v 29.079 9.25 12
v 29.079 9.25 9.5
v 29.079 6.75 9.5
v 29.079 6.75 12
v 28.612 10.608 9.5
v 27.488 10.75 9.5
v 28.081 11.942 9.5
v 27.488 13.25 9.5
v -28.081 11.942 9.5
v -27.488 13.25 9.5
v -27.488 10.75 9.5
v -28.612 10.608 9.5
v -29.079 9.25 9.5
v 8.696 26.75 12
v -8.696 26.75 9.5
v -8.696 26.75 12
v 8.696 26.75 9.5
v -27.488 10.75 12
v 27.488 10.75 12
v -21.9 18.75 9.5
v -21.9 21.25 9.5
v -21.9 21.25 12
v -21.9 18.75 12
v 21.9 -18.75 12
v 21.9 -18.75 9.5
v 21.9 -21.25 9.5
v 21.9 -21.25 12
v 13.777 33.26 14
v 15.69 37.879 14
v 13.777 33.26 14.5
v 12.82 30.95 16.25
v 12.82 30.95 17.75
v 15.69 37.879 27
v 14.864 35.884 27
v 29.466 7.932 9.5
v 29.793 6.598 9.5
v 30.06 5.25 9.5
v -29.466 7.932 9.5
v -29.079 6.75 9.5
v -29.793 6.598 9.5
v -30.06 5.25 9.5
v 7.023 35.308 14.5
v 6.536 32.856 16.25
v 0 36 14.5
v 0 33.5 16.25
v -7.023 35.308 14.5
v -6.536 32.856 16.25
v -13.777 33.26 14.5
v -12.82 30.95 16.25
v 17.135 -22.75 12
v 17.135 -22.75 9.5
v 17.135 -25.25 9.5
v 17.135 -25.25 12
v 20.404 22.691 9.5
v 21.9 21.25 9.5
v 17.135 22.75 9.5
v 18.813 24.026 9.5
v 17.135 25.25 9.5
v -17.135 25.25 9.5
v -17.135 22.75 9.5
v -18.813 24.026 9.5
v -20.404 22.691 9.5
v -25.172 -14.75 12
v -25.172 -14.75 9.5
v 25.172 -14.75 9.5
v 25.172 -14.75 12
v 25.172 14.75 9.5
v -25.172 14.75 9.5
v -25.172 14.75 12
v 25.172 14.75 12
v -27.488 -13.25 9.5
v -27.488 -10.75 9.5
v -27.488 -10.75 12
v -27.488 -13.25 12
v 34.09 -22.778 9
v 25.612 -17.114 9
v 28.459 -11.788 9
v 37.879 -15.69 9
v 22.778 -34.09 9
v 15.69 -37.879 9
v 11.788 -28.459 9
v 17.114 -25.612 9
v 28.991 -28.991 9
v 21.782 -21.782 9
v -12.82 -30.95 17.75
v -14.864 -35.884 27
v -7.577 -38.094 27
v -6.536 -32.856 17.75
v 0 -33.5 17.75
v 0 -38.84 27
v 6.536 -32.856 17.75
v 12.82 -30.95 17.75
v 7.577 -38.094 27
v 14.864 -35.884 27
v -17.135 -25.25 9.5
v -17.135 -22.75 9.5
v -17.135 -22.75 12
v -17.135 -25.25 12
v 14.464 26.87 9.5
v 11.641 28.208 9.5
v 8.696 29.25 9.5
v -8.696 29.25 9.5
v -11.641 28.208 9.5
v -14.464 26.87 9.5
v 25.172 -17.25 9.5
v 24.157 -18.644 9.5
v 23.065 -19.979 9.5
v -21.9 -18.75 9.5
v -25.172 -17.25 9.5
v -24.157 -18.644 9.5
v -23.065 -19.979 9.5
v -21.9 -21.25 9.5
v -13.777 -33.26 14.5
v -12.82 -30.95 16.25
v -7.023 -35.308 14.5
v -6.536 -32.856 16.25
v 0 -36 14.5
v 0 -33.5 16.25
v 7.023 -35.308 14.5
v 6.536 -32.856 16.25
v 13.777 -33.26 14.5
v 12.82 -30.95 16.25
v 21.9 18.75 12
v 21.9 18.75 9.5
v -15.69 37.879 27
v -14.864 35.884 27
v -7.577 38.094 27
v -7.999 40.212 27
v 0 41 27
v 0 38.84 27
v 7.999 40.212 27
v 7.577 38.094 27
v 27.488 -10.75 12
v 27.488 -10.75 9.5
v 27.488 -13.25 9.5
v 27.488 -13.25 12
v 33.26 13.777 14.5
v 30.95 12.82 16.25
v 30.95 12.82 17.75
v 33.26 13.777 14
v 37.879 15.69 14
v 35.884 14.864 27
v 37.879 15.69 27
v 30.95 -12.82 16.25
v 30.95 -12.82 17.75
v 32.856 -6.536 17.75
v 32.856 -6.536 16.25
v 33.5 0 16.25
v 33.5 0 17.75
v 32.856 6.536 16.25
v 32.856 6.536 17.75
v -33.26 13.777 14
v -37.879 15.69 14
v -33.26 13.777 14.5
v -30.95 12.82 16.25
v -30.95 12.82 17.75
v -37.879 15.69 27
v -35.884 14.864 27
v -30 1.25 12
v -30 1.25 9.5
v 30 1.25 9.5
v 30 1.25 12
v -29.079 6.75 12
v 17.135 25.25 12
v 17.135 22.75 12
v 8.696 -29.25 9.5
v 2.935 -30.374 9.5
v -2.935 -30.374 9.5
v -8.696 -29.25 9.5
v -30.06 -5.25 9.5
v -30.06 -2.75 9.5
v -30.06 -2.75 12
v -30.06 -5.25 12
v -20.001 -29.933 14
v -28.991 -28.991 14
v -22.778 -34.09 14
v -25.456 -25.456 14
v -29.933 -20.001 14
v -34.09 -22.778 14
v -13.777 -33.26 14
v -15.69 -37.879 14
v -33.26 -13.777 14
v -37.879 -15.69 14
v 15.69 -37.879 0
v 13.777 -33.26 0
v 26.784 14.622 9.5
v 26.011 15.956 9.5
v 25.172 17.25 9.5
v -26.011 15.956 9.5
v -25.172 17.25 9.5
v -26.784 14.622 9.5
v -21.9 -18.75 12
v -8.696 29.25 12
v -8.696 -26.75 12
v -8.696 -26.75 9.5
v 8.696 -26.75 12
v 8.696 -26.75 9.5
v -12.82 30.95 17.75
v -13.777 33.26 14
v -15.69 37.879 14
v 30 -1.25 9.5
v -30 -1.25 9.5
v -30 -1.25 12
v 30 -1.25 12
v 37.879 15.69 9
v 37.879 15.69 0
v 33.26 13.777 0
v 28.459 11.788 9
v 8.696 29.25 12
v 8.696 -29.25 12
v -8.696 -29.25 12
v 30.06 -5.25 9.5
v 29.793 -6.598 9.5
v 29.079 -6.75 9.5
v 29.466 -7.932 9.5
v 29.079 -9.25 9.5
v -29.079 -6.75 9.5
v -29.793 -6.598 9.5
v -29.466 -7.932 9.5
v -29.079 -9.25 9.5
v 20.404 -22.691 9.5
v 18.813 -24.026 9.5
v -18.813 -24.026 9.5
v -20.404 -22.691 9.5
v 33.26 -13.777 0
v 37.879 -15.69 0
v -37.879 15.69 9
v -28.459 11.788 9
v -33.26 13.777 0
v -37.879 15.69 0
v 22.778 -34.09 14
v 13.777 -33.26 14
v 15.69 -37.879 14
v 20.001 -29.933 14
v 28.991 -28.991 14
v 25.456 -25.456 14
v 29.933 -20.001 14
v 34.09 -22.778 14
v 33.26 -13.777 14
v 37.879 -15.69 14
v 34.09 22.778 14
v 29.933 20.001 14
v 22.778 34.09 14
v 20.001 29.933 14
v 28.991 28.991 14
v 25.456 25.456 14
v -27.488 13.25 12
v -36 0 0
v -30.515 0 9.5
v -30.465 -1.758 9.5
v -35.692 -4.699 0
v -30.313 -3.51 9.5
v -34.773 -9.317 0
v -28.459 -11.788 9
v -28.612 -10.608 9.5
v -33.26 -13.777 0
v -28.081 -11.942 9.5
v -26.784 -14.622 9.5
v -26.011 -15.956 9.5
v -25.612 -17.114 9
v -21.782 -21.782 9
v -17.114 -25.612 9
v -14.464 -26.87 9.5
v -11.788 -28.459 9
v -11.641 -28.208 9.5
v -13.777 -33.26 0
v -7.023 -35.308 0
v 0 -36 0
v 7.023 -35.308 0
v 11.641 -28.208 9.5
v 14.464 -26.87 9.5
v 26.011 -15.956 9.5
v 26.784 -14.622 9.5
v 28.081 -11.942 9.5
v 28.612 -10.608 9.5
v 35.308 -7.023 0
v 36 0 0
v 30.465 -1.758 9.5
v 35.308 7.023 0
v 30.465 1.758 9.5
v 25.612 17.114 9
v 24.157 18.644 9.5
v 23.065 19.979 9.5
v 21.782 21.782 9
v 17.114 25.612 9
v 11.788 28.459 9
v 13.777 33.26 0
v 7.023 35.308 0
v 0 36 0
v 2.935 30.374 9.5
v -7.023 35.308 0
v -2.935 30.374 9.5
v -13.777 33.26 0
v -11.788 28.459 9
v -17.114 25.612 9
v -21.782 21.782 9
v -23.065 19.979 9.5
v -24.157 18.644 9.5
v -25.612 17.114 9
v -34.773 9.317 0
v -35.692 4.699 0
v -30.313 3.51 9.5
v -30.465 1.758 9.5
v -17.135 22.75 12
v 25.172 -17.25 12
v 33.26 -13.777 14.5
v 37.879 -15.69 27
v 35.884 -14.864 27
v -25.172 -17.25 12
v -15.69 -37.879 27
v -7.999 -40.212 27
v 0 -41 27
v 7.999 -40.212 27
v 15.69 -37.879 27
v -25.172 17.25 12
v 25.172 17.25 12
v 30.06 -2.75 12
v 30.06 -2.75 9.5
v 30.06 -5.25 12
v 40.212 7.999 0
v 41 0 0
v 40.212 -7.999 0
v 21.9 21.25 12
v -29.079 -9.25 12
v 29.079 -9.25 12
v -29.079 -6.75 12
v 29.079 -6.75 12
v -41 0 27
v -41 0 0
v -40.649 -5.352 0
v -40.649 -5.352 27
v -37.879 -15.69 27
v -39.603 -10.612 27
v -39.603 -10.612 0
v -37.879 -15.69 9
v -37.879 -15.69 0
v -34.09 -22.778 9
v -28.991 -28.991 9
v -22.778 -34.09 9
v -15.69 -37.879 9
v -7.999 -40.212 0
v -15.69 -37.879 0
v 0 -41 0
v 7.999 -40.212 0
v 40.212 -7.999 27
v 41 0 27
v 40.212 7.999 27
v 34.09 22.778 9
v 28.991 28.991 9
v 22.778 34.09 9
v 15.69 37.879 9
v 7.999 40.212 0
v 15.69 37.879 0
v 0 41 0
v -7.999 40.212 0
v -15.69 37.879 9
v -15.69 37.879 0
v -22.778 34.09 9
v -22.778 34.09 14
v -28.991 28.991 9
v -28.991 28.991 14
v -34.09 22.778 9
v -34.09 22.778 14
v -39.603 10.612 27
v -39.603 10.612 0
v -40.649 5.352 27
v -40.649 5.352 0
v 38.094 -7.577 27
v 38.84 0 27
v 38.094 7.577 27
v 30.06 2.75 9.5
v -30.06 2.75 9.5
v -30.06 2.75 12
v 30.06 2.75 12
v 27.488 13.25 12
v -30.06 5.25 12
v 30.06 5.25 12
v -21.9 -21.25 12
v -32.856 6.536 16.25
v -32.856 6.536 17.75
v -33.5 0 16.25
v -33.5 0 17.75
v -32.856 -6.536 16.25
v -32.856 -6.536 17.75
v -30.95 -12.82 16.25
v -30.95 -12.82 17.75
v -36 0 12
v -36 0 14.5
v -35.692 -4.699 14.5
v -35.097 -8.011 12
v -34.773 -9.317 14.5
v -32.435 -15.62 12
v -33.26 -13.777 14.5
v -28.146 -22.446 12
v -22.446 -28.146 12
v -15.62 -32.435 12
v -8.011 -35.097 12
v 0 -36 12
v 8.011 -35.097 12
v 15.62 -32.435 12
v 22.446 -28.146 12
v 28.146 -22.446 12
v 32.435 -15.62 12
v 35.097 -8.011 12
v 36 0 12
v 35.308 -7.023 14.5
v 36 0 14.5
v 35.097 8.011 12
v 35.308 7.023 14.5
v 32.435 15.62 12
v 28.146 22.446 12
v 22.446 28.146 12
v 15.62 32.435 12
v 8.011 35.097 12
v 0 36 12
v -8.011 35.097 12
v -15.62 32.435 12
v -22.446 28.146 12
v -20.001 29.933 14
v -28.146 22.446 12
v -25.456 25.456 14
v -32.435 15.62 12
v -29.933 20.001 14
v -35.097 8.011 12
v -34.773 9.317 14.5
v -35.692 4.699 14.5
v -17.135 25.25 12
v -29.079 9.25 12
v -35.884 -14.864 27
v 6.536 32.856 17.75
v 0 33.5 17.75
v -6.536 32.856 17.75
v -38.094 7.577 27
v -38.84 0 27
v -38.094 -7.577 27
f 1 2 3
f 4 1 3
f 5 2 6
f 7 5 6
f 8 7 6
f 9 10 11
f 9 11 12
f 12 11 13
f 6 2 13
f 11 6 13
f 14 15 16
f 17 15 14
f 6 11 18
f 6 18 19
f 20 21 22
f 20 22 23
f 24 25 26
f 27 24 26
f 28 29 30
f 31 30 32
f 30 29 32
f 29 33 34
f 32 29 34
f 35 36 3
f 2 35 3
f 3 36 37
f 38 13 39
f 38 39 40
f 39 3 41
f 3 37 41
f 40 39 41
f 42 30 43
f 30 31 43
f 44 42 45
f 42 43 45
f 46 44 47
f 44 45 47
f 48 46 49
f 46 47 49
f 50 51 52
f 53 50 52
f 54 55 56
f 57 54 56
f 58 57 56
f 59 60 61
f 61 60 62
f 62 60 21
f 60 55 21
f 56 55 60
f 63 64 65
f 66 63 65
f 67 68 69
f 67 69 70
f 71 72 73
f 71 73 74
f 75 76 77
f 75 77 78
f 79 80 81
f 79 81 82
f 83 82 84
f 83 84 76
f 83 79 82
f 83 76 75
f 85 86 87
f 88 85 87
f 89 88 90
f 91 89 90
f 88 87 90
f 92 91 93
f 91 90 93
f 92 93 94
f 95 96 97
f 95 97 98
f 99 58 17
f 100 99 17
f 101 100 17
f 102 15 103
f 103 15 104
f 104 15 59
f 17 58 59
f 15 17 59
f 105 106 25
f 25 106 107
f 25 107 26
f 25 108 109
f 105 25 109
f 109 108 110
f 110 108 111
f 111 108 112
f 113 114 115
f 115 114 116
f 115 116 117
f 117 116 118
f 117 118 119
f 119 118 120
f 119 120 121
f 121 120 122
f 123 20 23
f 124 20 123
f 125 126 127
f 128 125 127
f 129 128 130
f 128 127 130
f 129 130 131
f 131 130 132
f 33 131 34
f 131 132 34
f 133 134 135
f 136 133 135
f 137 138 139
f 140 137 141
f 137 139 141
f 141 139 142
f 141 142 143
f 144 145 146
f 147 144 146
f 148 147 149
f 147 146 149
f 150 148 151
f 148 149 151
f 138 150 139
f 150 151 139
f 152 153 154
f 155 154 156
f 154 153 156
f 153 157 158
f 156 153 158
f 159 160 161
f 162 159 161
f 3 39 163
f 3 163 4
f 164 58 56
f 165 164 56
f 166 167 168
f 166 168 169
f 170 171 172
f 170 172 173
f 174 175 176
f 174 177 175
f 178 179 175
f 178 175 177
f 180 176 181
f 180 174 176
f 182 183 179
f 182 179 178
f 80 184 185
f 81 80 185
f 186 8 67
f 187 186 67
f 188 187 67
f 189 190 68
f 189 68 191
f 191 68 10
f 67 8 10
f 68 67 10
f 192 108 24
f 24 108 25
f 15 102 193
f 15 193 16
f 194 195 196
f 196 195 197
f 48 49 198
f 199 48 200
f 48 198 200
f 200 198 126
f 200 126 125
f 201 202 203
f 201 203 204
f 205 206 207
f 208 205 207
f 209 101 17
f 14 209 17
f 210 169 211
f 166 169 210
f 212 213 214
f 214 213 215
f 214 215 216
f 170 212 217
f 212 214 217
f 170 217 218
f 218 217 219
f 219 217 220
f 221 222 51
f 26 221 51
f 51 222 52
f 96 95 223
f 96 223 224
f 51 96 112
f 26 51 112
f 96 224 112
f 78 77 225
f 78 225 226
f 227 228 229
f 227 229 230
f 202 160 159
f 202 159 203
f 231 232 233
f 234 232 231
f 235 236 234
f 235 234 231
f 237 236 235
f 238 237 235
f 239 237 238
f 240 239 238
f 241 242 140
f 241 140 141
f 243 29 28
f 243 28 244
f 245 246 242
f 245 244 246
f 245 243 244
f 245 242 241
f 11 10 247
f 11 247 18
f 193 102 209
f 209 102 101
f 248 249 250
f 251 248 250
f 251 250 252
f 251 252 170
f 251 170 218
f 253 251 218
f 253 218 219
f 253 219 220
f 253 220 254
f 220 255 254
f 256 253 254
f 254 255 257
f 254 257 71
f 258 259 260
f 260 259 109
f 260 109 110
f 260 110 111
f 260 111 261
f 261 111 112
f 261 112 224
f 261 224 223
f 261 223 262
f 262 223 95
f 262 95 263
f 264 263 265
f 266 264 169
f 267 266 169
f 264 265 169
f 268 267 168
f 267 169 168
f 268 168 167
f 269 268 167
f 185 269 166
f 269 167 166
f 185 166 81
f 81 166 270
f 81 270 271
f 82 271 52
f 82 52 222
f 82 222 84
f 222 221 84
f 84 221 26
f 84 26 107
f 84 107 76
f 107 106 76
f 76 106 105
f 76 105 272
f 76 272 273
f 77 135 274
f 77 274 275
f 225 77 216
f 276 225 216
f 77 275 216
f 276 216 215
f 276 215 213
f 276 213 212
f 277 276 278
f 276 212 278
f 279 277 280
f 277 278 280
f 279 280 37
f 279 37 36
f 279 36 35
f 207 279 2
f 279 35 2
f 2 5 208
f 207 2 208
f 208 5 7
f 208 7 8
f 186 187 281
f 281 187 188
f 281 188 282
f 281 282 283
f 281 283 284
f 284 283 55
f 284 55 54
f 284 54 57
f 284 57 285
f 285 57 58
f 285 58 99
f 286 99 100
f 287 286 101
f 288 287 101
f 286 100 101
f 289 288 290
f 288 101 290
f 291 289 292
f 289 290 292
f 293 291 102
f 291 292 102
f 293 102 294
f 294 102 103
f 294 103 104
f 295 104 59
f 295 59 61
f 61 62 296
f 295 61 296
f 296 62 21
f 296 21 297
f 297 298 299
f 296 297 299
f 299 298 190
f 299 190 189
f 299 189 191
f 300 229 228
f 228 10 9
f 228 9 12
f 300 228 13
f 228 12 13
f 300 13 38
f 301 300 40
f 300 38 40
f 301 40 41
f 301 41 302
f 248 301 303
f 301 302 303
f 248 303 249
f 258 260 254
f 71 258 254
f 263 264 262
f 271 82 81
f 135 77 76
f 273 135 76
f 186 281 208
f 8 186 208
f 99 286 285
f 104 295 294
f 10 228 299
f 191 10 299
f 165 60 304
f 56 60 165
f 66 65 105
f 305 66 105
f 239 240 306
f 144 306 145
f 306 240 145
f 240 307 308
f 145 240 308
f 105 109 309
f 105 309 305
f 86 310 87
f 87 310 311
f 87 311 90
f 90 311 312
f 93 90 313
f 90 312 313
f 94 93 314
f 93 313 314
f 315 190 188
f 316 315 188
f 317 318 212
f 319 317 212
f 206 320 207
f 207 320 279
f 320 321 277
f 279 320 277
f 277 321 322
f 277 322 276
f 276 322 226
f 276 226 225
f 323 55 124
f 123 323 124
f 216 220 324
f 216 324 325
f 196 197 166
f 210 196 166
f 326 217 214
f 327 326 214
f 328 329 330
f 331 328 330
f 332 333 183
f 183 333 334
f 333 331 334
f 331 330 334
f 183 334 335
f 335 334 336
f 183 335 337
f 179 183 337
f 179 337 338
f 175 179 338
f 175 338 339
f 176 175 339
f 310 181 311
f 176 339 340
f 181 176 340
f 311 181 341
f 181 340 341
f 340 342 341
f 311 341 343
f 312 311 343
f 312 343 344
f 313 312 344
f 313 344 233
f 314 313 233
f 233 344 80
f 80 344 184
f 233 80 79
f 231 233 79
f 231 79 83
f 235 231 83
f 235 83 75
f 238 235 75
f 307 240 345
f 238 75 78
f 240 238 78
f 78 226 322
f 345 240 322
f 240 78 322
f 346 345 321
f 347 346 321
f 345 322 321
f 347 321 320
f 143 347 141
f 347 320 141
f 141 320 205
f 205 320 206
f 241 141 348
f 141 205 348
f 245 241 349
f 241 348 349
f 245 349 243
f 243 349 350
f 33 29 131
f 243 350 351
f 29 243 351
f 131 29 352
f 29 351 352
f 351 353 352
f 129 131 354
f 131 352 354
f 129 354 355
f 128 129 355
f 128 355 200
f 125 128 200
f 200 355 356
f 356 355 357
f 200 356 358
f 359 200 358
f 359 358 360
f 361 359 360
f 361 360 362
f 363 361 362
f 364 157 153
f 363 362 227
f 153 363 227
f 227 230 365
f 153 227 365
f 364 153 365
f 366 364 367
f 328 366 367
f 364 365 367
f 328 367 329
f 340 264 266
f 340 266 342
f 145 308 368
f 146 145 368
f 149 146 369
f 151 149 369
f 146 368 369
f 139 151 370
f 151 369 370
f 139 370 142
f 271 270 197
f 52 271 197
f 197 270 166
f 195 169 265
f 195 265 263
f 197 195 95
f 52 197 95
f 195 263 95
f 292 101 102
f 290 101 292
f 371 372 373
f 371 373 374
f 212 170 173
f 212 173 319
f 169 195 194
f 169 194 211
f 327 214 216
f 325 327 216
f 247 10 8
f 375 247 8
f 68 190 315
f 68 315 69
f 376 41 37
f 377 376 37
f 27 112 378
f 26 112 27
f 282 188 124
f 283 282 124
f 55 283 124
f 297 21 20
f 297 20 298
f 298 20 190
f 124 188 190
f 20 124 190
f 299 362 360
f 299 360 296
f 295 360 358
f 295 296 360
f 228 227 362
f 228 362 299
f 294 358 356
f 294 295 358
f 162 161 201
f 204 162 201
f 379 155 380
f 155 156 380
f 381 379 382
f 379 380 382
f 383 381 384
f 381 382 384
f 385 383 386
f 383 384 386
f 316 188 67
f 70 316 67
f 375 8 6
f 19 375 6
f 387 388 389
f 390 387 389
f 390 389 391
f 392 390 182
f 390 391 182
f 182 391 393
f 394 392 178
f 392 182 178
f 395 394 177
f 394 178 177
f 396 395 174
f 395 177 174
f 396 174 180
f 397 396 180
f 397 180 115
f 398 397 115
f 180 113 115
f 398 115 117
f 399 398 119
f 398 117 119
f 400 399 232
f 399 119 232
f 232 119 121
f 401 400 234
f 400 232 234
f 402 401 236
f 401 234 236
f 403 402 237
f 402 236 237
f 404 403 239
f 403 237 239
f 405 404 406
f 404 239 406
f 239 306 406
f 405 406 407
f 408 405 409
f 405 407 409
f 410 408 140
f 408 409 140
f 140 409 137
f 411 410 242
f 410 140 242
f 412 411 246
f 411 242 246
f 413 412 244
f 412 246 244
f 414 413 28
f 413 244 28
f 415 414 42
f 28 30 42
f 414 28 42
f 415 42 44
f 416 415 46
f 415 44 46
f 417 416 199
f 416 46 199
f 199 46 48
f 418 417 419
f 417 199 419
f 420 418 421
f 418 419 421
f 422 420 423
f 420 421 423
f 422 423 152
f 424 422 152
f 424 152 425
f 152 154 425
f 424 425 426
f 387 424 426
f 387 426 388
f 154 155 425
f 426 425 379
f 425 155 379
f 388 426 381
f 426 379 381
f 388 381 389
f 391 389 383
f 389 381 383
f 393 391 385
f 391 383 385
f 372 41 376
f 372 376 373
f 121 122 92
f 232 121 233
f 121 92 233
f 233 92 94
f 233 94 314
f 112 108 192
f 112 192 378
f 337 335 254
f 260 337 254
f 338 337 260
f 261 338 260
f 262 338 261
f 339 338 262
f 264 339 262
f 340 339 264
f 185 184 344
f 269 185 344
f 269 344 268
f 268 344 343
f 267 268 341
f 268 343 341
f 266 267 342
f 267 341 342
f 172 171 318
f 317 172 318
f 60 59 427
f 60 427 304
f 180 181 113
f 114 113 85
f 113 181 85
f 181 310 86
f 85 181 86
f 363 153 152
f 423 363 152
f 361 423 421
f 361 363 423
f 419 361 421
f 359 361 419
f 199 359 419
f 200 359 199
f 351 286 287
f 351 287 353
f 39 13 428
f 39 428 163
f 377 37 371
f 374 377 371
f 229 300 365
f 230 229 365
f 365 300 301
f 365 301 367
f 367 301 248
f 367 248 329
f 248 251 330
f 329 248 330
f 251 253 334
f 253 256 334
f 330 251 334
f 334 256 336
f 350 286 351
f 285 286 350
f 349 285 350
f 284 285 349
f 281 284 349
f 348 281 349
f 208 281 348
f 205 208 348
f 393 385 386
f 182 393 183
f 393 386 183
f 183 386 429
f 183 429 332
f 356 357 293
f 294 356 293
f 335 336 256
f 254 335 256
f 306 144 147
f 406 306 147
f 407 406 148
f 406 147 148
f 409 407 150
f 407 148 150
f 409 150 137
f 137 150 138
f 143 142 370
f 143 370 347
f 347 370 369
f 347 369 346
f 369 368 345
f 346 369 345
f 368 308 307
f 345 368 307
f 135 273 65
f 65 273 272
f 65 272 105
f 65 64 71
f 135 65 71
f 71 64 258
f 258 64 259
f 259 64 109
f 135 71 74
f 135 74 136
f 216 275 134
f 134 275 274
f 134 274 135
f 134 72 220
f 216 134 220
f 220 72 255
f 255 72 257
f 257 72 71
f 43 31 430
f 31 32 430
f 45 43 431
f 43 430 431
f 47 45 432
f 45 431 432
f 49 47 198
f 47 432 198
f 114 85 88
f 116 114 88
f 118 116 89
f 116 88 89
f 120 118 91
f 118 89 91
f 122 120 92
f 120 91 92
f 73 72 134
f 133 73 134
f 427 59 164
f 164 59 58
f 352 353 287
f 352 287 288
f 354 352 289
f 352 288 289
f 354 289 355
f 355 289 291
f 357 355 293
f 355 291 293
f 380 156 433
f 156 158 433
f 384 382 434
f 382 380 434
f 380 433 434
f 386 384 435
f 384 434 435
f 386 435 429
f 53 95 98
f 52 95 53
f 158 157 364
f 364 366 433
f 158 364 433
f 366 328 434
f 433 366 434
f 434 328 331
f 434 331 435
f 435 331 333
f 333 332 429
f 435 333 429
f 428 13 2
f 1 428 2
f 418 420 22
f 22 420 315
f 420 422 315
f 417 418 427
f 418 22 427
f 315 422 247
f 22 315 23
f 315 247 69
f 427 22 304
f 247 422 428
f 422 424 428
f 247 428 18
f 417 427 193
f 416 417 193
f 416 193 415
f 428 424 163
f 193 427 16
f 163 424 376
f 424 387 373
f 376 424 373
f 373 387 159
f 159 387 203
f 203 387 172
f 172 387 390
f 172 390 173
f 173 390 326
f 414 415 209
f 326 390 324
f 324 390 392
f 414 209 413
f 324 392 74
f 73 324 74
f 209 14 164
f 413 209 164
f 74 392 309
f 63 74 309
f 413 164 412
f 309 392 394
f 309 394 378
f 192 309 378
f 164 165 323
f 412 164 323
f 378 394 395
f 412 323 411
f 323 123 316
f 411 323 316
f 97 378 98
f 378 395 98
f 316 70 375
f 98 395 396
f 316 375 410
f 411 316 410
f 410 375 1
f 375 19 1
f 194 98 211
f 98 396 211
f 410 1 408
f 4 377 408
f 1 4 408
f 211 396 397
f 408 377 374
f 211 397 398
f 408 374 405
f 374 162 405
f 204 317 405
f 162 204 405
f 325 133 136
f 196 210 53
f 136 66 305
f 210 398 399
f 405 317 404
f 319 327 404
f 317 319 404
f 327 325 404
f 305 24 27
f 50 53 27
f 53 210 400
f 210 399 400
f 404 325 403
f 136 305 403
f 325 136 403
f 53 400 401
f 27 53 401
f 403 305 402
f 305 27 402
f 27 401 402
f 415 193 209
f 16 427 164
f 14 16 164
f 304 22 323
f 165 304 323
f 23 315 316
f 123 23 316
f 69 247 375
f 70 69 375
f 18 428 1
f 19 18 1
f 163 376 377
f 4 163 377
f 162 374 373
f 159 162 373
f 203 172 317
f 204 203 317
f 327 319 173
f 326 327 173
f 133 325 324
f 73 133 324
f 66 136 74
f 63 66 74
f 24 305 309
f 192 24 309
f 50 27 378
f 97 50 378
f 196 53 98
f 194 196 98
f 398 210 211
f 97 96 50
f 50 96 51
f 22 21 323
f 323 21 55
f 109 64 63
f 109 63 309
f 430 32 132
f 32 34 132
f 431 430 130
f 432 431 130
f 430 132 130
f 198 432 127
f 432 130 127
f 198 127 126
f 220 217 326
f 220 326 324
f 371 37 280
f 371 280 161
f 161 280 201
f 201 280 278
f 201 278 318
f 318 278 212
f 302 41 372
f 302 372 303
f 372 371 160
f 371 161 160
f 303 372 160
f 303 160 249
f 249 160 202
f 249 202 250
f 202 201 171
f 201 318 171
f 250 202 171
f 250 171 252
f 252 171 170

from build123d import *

# Parameters (mm, degrees)
F3_DEPTH      = 9
F4_W          = 60
F4_H          = 2.5
F4_W_2        = 60.1203209974
F4_W_3        = 58.1588600028
F4_W_4        = 54.9768405497
F4_W_5        = 50.3433510687
F4_W_6        = 43.8001483654
F4_W_7        = 17.3911758323
F4_W_8        = 34.2702932119
F5_DEPTH      = 2.5
F5_DEPTH_BACK = 25
F7_DEPTH      = 13


with BuildPart() as f1:
    # F0 (on Front) → F1 (revolve)
    with BuildSketch(Plane.XZ):
        Polygon((-41, 0), (-36, 0), (-30.5151724427, 9.5), (0, 9.5), (0, 12), (-36, 12), (-36, 14.5), (-33.5, 16.25), (-33.5, 17.75), (-38.84048999, 27), (-41, 27), align=None)
    revolve(axis=Axis((0, 0, 37.0227386814), (0, 0, 1)))

    # F2 (on face) → F3 (cut)
    with BuildSketch(Plane(origin=(0, 0, 0), x_dir=(1, 0, 0), z_dir=(0, 0, -1))):
        with BuildLine():
            Line((15.690020727, 37.879060833), (0, 0))
            Line((0, 0), (37.879060833, 15.690020727))
            ThreePointArc((37.879060833, 15.690020727), (28.9913780286, 28.9913780286), (15.690020727, 37.879060833))
        make_face()
        with BuildLine():
            Line((-37.879060833, 15.690020727), (0, 0))
            Line((0, 0), (-15.690020727, 37.879060833))
            ThreePointArc((-15.690020727, 37.879060833), (-28.9913780286, 28.9913780286), (-37.879060833, 15.690020727))
        make_face()
        with BuildLine():
            Line((-15.690020727, -37.879060833), (0, 0))
            Line((0, 0), (-37.879060833, -15.690020727))
            ThreePointArc((-37.879060833, -15.690020727), (-28.9913780286, -28.9913780286), (-15.690020727, -37.879060833))
        make_face()
        with BuildLine():
            Line((37.879060833, -15.690020727), (0, 0))
            Line((0, 0), (15.690020727, -37.879060833))
            ThreePointArc((15.690020727, -37.879060833), (28.9913780286, -28.9913780286), (37.879060833, -15.690020727))
        make_face()
    extrude(amount=-F3_DEPTH, mode=Mode.SUBTRACT)

    # F4 (on face) → F5 (cut, two sides)
    with BuildSketch(Plane(origin=(0, 0, 9.5), x_dir=(1, 0, 0), z_dir=(0, 0, -1))) as f5_sk:
        Rectangle(F4_W, F4_H)
        with Locations((0, -4)):
            Rectangle(F4_W_2, F4_H)
        with Locations((0, -8)):
            Rectangle(F4_W_3, F4_H)
        with Locations((0, -12)):
            Rectangle(F4_W_4, F4_H)
        with Locations((0, -16)):
            Rectangle(F4_W_5, F4_H)
        with Locations((0, -20)):
            Rectangle(F4_W_6, F4_H)
        with Locations((0, -28)):
            Rectangle(F4_W_7, F4_H)
        with Locations((0, -24)):
            Rectangle(F4_W_8, F4_H)
        with Locations((0, 24)):
            Rectangle(F4_W_8, F4_H)
        with Locations((0, 4)):
            Rectangle(F4_W_2, F4_H)
        with Locations((0, 16)):
            Rectangle(F4_W_5, F4_H)
        with Locations((0, 12)):
            Rectangle(F4_W_4, F4_H)
        with Locations((0, 28)):
            Rectangle(F4_W_7, F4_H)
        with Locations((0, 20)):
            Rectangle(F4_W_6, F4_H)
        with Locations((0, 8)):
            Rectangle(F4_W_3, F4_H)
    extrude(amount=-F5_DEPTH, mode=Mode.SUBTRACT)
    extrude(f5_sk.sketch, amount=F5_DEPTH_BACK, mode=Mode.SUBTRACT)

    # F6 (on face) → F7 (cut)
    with BuildSketch(Plane.XY.offset(27)):
        with BuildLine():
            Line((-15.690020727, -37.879060833), (0, 0))
            Line((0, 0), (-37.879060833, -15.690020727))
            ThreePointArc((-37.879060833, -15.690020727), (-28.9913780286, -28.9913780286), (-15.690020727, -37.879060833))
        make_face()
        with BuildLine():
            Line((37.879060833, -15.690020727), (0, 0))
            Line((0, 0), (15.690020727, -37.879060833))
            ThreePointArc((15.690020727, -37.879060833), (28.9913780286, -28.9913780286), (37.879060833, -15.690020727))
        make_face()
        with BuildLine():
            Line((15.690020727, 37.879060833), (0, 0))
            Line((0, 0), (37.879060833, 15.690020727))
            ThreePointArc((37.879060833, 15.690020727), (28.9913780286, 28.9913780286), (15.690020727, 37.879060833))
        make_face()
        with BuildLine():
            Line((-37.879060833, 15.690020727), (0, 0))
            Line((0, 0), (-15.690020727, 37.879060833))
            ThreePointArc((-15.690020727, 37.879060833), (-28.9913780286, 28.9913780286), (-37.879060833, 15.690020727))
        make_face()
    extrude(amount=-F7_DEPTH, mode=Mode.SUBTRACT)


solid = f1.part
